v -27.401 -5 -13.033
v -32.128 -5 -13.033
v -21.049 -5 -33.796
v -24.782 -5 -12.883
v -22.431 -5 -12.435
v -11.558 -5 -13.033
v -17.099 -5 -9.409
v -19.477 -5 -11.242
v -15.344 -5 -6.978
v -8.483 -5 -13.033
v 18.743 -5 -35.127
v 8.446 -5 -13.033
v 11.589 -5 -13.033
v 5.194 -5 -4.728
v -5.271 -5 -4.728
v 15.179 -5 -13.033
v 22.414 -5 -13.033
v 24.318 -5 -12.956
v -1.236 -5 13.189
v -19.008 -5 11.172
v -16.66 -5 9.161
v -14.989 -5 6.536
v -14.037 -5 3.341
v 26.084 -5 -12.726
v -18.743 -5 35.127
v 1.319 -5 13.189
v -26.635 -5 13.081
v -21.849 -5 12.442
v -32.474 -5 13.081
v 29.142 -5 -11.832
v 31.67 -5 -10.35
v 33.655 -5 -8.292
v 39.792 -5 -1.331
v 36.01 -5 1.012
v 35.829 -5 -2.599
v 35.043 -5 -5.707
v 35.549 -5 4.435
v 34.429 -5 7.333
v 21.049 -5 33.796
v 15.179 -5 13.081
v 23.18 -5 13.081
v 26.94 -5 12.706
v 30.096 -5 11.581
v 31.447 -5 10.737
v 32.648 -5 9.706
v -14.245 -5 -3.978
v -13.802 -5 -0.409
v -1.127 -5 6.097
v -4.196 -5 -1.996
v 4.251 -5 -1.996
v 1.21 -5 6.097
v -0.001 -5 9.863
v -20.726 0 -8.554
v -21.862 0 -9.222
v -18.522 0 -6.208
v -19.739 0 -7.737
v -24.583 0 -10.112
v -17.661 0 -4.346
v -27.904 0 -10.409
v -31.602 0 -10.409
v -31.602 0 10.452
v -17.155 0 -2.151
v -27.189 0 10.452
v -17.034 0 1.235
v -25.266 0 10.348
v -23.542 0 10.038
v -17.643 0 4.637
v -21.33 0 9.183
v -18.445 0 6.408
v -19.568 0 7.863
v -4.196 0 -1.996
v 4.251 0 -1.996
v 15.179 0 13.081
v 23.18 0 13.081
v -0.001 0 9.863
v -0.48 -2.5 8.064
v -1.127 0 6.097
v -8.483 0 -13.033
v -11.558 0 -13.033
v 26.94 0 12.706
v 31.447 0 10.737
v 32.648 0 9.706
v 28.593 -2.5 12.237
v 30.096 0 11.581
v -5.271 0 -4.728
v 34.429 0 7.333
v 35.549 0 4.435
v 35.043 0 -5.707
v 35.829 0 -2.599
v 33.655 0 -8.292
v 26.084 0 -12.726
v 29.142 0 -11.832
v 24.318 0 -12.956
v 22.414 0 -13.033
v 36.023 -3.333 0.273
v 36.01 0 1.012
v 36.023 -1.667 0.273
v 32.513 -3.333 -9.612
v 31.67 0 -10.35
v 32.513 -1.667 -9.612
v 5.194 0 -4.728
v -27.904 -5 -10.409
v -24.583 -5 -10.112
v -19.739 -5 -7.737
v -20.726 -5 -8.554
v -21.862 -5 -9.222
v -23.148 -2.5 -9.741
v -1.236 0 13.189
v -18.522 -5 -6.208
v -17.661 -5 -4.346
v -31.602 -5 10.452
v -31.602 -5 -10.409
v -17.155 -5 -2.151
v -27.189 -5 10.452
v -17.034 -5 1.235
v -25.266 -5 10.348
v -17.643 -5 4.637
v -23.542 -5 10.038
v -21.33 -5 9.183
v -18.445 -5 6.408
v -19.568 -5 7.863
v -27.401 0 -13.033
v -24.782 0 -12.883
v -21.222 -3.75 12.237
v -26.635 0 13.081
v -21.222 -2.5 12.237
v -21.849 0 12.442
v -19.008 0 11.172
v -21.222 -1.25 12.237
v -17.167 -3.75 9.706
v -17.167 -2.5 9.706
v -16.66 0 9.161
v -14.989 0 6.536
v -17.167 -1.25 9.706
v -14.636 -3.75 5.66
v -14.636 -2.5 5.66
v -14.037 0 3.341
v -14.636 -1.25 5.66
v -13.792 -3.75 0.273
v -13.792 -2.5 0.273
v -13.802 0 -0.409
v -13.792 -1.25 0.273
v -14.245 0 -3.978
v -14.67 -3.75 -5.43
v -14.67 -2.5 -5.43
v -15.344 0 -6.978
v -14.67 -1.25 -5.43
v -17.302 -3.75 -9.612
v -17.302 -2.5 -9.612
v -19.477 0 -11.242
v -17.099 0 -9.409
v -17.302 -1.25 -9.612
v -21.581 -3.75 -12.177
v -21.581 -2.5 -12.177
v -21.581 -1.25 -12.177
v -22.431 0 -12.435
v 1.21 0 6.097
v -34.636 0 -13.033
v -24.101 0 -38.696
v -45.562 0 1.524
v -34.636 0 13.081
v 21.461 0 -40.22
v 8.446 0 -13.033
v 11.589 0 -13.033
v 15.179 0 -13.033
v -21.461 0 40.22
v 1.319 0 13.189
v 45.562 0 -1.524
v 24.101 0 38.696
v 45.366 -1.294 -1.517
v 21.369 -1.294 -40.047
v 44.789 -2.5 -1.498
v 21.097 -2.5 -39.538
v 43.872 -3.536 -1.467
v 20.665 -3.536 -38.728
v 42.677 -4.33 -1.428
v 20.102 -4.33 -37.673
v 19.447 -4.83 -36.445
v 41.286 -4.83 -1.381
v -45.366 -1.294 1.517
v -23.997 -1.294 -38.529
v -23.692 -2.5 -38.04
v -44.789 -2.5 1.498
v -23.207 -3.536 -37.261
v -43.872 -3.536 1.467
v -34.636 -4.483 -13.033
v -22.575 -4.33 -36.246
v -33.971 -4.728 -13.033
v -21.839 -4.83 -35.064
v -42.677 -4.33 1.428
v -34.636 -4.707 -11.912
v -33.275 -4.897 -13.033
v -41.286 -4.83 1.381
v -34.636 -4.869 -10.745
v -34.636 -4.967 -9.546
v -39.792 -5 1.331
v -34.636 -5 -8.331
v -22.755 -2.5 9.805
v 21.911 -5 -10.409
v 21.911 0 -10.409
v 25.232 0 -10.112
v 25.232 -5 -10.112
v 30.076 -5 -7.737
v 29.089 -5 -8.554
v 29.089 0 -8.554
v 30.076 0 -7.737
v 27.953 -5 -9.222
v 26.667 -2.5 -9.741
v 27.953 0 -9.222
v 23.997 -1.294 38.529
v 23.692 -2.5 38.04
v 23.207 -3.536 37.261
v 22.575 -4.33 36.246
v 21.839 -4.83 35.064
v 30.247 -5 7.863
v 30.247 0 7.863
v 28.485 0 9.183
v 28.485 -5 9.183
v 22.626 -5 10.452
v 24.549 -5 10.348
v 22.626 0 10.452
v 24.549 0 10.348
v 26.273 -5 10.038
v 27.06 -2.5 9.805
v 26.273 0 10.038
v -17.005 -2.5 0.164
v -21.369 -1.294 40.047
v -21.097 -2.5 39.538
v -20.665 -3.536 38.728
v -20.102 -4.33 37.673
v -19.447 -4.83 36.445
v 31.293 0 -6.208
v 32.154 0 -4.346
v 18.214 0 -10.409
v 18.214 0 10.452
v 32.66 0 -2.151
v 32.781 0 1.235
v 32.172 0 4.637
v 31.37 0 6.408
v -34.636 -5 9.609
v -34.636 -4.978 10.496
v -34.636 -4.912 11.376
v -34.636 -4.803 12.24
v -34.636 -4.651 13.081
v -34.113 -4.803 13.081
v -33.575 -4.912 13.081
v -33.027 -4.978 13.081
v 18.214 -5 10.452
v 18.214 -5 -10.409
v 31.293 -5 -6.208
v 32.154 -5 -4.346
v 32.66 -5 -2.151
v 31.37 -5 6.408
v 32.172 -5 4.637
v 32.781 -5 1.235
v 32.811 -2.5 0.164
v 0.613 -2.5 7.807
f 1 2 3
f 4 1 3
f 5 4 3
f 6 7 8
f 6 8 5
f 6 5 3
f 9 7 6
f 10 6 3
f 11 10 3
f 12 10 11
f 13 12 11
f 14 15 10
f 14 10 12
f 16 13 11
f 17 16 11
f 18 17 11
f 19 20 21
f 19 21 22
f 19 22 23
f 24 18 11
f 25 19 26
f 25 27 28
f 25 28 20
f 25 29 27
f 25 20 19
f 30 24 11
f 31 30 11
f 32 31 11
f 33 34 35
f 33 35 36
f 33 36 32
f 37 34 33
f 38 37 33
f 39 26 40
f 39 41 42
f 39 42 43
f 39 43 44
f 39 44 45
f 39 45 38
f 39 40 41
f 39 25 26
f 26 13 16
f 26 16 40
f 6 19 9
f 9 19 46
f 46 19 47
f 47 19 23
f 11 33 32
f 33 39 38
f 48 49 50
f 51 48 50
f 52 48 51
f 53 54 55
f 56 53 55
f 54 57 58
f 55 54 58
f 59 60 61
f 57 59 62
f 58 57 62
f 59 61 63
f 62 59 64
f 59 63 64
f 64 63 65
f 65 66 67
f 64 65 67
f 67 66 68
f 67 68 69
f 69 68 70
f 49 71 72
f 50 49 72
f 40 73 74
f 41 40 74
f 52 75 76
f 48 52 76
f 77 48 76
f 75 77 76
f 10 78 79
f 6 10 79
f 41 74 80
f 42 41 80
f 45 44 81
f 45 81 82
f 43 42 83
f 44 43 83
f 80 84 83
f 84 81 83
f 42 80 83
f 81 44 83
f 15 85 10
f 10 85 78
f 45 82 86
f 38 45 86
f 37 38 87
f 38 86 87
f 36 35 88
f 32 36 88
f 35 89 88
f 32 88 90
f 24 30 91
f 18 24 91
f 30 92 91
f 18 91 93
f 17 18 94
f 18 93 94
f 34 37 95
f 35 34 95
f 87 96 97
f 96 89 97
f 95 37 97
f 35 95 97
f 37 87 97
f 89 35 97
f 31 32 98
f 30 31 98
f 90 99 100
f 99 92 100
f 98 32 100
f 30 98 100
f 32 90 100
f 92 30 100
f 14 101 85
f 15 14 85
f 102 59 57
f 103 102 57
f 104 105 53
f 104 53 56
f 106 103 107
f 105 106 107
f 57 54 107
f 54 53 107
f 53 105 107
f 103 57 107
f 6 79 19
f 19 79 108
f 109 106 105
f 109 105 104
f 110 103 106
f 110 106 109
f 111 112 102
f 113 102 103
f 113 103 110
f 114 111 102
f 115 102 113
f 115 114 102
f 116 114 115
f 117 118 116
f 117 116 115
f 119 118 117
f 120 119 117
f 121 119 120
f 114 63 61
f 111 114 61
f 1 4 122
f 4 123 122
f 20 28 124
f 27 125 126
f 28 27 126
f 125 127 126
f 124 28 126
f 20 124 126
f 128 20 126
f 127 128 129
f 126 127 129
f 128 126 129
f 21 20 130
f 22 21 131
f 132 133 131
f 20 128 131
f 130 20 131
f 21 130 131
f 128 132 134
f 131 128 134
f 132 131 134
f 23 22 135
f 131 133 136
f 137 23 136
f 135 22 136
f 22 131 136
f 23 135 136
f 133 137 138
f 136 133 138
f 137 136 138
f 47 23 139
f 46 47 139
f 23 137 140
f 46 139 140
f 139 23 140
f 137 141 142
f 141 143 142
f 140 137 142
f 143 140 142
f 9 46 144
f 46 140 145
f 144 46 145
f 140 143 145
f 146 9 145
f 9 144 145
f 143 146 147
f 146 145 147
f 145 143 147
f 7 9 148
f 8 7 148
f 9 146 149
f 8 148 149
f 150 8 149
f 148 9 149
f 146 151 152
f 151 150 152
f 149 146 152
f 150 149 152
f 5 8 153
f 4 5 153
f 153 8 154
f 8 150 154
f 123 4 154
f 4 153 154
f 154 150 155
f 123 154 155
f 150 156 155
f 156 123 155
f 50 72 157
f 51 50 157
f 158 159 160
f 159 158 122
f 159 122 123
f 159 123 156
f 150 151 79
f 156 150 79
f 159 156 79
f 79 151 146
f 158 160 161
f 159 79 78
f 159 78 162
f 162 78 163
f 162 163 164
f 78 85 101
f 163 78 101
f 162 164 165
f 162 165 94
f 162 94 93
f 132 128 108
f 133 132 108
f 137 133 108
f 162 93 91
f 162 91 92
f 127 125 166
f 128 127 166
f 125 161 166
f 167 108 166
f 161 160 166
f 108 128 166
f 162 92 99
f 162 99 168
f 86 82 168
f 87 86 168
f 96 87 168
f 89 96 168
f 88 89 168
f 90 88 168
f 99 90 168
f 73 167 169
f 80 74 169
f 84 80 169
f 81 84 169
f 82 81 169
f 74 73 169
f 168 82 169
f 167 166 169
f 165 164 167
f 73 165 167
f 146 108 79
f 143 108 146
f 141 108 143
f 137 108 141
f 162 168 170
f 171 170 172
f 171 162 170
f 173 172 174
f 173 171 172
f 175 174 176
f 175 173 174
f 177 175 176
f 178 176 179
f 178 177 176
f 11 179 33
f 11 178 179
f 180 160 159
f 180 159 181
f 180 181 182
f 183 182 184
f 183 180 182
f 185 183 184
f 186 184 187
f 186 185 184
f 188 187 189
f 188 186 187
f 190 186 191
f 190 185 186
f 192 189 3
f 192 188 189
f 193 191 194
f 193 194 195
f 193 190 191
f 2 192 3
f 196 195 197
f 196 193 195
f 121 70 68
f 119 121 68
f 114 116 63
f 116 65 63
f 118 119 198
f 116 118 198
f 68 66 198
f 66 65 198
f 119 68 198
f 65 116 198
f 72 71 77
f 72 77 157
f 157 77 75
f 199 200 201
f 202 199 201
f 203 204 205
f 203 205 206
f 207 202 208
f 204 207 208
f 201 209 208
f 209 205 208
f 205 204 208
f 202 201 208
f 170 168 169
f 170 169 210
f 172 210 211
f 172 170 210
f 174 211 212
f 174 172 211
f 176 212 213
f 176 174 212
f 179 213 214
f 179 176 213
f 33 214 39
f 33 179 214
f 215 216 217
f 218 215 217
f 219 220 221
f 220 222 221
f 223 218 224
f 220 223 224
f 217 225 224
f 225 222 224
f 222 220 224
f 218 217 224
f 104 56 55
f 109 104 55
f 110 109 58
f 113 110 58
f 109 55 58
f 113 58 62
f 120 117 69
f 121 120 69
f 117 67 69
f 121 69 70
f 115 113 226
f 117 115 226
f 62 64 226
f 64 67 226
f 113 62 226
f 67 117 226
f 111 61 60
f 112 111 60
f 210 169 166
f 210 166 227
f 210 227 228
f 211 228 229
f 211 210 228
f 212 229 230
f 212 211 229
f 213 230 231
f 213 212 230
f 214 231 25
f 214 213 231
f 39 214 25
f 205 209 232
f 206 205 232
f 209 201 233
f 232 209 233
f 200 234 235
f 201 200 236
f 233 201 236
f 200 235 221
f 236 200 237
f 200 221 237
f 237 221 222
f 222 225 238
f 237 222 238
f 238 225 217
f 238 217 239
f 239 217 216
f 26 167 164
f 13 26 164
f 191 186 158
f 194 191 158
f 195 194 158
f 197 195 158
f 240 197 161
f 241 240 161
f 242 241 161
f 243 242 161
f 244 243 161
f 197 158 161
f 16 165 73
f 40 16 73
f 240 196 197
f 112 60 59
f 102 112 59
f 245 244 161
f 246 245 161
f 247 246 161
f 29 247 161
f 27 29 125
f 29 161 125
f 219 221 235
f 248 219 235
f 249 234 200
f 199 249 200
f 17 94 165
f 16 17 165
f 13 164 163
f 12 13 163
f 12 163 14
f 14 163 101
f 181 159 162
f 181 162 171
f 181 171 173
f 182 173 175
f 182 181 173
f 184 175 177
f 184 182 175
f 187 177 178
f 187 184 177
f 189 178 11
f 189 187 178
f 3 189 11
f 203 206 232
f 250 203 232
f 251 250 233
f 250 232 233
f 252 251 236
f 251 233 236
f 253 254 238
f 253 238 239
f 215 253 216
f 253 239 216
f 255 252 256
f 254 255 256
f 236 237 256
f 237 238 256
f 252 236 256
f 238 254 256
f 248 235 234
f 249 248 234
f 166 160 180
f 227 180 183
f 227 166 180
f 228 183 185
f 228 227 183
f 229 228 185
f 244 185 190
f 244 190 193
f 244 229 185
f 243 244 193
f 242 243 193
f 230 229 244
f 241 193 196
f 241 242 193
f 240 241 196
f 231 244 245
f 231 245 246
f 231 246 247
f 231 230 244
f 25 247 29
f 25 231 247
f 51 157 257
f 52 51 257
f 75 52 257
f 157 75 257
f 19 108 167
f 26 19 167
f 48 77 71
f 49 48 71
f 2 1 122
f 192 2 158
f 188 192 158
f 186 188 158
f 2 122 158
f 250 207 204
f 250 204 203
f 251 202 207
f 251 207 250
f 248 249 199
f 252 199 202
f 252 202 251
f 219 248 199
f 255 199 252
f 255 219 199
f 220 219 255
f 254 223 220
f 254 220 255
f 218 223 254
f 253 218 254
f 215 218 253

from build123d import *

# Parameters (mm, degrees)
F1_DEPTH     = 5
F2_T1_DEPTH  = 70.5879001638
F2_T3_DEPTH  = 70.5879001638
F2_T5_DEPTH  = 70.5879001638
F2_T7_DEPTH  = 70.5879001638
F2_T9_DEPTH  = 70.5879001638
F2_T11_DEPTH = 70.5879001638


# Not quite as in the source:
# - a fillet or chamfer that OpenCascade refuses, or shapes differently, is made with other operations: its cross-section is extruded or revolved along the edge and cut away or added


with BuildPart() as f1:
    # F0 (on Front) → F1 (new body)
    with BuildSketch(Plane.XZ):
        with BuildLine():
            Line((-4.1963754653, -1.9962660098), (4.2509359723, -1.9962660098))
            Line((4.2509359723, -1.9962660098), (1.2103610841, 6.0966927153))
            add(Edge.make_bspline(
                [(1.2103610841, 6.0966927153), (0.621678352, 7.6341262584), (-0.0012965781, 9.8631191276)],
                knots=[0, 0, 0, 1, 1, 1], degree=2))
            add(Edge.make_bspline(
                [(-0.0012965781, 9.8631191276), (-0.395656855, 8.1485092282), (-1.1272237454, 6.0966927153)],
                knots=[0, 0, 0, 1, 1, 1], degree=2))
            Line((-1.1272237454, 6.0966927153), (-4.1963754653, -1.9962660098))
        make_face()
    extrude(amount=F1_DEPTH)


with BuildPart() as f1b:
    # F0 (on Front) → F1, piece 2 (new body)
    with BuildSketch(Plane.XZ):
        with BuildLine():
            add(Edge.make_bspline(
                [(30.0758187402, -7.7373514895), (32.8106215297, -5.0654177297), (32.8106215297, 0.1641424634)],
                knots=[0, 0, 0, 1, 1, 1], degree=2))
            add(Edge.make_bspline(
                [(32.8106215297, 0.1641424634), (32.8106215297, 5.2736799636), (30.2472797301, 7.8627409117)],
                knots=[0, 0, 0, 1, 1, 1], degree=2))
            add(Edge.make_bspline(
                [(30.2472797301, 7.8627409117), (27.6839379305, 10.4518018597), (22.6258387274, 10.4518018597)],
                knots=[0, 0, 0, 1, 1, 1], degree=2))
            Line((22.6258387274, 10.4518018597), (18.2135759196, 10.4518018597))
            Line((18.2135759196, 10.4518018597), (18.2135759196, -10.4092852494))
            Line((18.2135759196, -10.4092852494), (21.911417936, -10.4092852494))
            add(Edge.make_bspline(
                [(21.911417936, -10.4092852494), (27.3410159507, -10.4092852494), (30.0758187402, -7.7373514895)],
                knots=[0, 0, 0, 1, 1, 1], degree=2))
        make_face()
    extrude(amount=F1_DEPTH)


with BuildPart() as f1c:
    # F0 (on Front) → F1, piece 3 (new body)
    with BuildSketch(Plane.XZ):
        Polygon((45.5624192078, -1.5240069806), (24.1010383647, 38.6962090015), (-21.4613808431, 40.2202159821), (-45.5624192078, 1.5240069806), (-24.1010383647, -38.6962090015), (21.4613808431, -40.2202159821), align=None)
        with BuildLine():
            add(Edge.make_bspline(
                [(-17.1673993541, 9.7059465535), (-13.7924755355, 6.3310227349), (-13.7924755355, 0.2727344237)],
                knots=[0, 0, 0, 1, 1, 1], degree=2))
            add(Edge.make_bspline(
                [(-13.7924755355, 0.2727344237), (-13.7924755355, -6.1913448969), (-17.3017104629, -9.6119916462)],
                knots=[0, 0, 0, 1, 1, 1], degree=2))
            add(Edge.make_bspline(
                [(-17.3017104629, -9.6119916462), (-20.8109453903, -13.0326383955), (-27.4007627703, -13.0326383955)],
                knots=[0, 0, 0, 1, 1, 1], degree=2))
            Line((-27.4007627703, -13.0326383955), (-34.6364165456, -13.0326383955))
            Line((-34.6364165456, -13.0326383955), (-34.6364165456, 13.0808703721))
            Line((-34.6364165456, 13.0808703721), (-26.6349036819, 13.0808703721))
            add(Edge.make_bspline(
                [(-26.6349036819, 13.0808703721), (-20.5423231727, 13.0808703721), (-17.1673993541, 9.7059465535)],
                knots=[0, 0, 0, 1, 1, 1], degree=2))
        make_face(mode=Mode.SUBTRACT)
        Polygon((11.5894663417, -13.0326383955), (8.4460148595, -13.0326383955), (5.193971417, -4.7282111161), (-5.2708643356, -4.7282111161), (-8.4829002137, -13.0326383955), (-11.5577673, -13.0326383955), (-1.2358157057, 13.1894623324), (1.3189530444, 13.1894623324), align=None, mode=Mode.SUBTRACT)
        with BuildLine():
            add(Edge.make_bspline(
                [(32.6477335892, 9.7059465535), (36.0226574079, 6.3310227349), (36.0226574079, 0.2727344237)],
                knots=[0, 0, 0, 1, 1, 1], degree=2))
            add(Edge.make_bspline(
                [(36.0226574079, 0.2727344237), (36.0226574079, -6.1913448969), (32.5134224805, -9.6119916462)],
                knots=[0, 0, 0, 1, 1, 1], degree=2))
            add(Edge.make_bspline(
                [(32.5134224805, -9.6119916462), (29.0041875531, -13.0326383955), (22.4143701731, -13.0326383955)],
                knots=[0, 0, 0, 1, 1, 1], degree=2))
            Line((22.4143701731, -13.0326383955), (15.1787163977, -13.0326383955))
            Line((15.1787163977, -13.0326383955), (15.1787163977, 13.0808703721))
            Line((15.1787163977, 13.0808703721), (23.1802292615, 13.0808703721))
            add(Edge.make_bspline(
                [(23.1802292615, 13.0808703721), (29.2728097706, 13.0808703721), (32.6477335892, 9.7059465535)],
                knots=[0, 0, 0, 1, 1, 1], degree=2))
        make_face(mode=Mode.SUBTRACT)
    extrude(amount=F1_DEPTH)

    # F2: fillet of radius 5 on 6 edges, made by hand

    # F2_s2 → F2_t1 (cut)
    with BuildSketch(Plane(origin=(18.6589169913, 0, 29.9584333551), x_dir=(0, 1, 0), z_dir=(-0.5286718247, 0, -0.8488263084))):
        with BuildLine():
            ThreePointArc((0, -39.480279647), (-3.5355339059, -38.015813553), (-5, -34.480279647))
            Line((-5, -34.480279647), (-5, -39.480279647))
            Line((-5, -39.480279647), (0, -39.480279647))
        make_face()
    extrude(amount=F2_T1_DEPTH, mode=Mode.SUBTRACT)

    # F2_s4 → F2_t3 (cut)
    with BuildSketch(Plane(origin=(35.2742228388, 0, -1.179879444), x_dir=(0, 1, 0), z_dir=(-0.9994410588, 0, 0.0334300763))):
        with BuildLine():
            ThreePointArc((0, -39.480279647), (-3.5355339059, -38.015813553), (-5, -34.480279647))
            Line((-5, -34.480279647), (-5, -39.480279647))
            Line((-5, -39.480279647), (0, -39.480279647))
        make_face()
    extrude(amount=F2_T3_DEPTH, mode=Mode.SUBTRACT)

    # F2_s6 → F2_t5 (cut)
    with BuildSketch(Plane(origin=(16.6153058475, 0, -31.1383127992), x_dir=(0, 1, 0), z_dir=(-0.4707692341, 0, 0.8822563846))):
        with BuildLine():
            ThreePointArc((0, -39.480279647), (-3.5355339059, -38.015813553), (-5, -34.480279647))
            Line((-5, -34.480279647), (-5, -39.480279647))
            Line((-5, -39.480279647), (0, -39.480279647))
        make_face()
    extrude(amount=F2_T5_DEPTH, mode=Mode.SUBTRACT)

    # F2_s8 → F2_t7 (cut)
    with BuildSketch(Plane(origin=(-18.6589169913, 0, -29.9584333551), x_dir=(0, 1, 0), z_dir=(0.5286718247, 0, 0.8488263084))):
        with BuildLine():
            ThreePointArc((0, -39.480279647), (-3.5355339059, -38.015813553), (-5, -34.480279647))
            Line((-5, -34.480279647), (-5, -39.480279647))
            Line((-5, -39.480279647), (0, -39.480279647))
        make_face()
    extrude(amount=F2_T7_DEPTH, mode=Mode.SUBTRACT)

    # F2_s10 → F2_t9 (cut)
    with BuildSketch(Plane(origin=(-16.6153058475, 0, 31.1383127992), x_dir=(0, 1, 0), z_dir=(0.4707692341, 0, -0.8822563846))):
        with BuildLine():
            ThreePointArc((0, -39.480279647), (-3.5355339059, -38.015813553), (-5, -34.480279647))
            Line((-5, -34.480279647), (-5, -39.480279647))
            Line((-5, -39.480279647), (0, -39.480279647))
        make_face()
    extrude(amount=F2_T9_DEPTH, mode=Mode.SUBTRACT)

    # F2_s12 → F2_t11 (cut)
    with BuildSketch(Plane(origin=(-35.2742228388, 0, 1.179879444), x_dir=(0, 1, 0), z_dir=(0.9994410588, 0, -0.0334300763))):
        with BuildLine():
            ThreePointArc((0, -39.480279647), (-3.5355339059, -38.015813553), (-5, -34.480279647))
            Line((-5, -34.480279647), (-5, -39.480279647))
            Line((-5, -39.480279647), (0, -39.480279647))
        make_face()
    extrude(amount=F2_T11_DEPTH, mode=Mode.SUBTRACT)


with BuildPart() as f1d:
    # F0 (on Front) → F1, piece 4 (new body)
    with BuildSketch(Plane.XZ):
        with BuildLine():
            add(Edge.make_bspline(
                [(-19.7393142032, -7.7373514895), (-17.0045114137, -5.0654177297), (-17.0045114137, 0.1641424634)],
                knots=[0, 0, 0, 1, 1, 1], degree=2))
            add(Edge.make_bspline(
                [(-17.0045114137, 0.1641424634), (-17.0045114137, 5.2736799636), (-19.5678532132, 7.8627409117)],
                knots=[0, 0, 0, 1, 1, 1], degree=2))
            add(Edge.make_bspline(
                [(-19.5678532132, 7.8627409117), (-22.1311950128, 10.4518018597), (-27.189294216, 10.4518018597)],
                knots=[0, 0, 0, 1, 1, 1], degree=2))
            Line((-27.189294216, 10.4518018597), (-31.6015570237, 10.4518018597))
            Line((-31.6015570237, 10.4518018597), (-31.6015570237, -10.4092852494))
            Line((-31.6015570237, -10.4092852494), (-27.9037150074, -10.4092852494))
            add(Edge.make_bspline(
                [(-27.9037150074, -10.4092852494), (-22.4741169927, -10.4092852494), (-19.7393142032, -7.7373514895)],
                knots=[0, 0, 0, 1, 1, 1], degree=2))
        make_face()
    extrude(amount=F1_DEPTH)


solid = Compound([f1.part, f1b.part, f1c.part, f1d.part])
